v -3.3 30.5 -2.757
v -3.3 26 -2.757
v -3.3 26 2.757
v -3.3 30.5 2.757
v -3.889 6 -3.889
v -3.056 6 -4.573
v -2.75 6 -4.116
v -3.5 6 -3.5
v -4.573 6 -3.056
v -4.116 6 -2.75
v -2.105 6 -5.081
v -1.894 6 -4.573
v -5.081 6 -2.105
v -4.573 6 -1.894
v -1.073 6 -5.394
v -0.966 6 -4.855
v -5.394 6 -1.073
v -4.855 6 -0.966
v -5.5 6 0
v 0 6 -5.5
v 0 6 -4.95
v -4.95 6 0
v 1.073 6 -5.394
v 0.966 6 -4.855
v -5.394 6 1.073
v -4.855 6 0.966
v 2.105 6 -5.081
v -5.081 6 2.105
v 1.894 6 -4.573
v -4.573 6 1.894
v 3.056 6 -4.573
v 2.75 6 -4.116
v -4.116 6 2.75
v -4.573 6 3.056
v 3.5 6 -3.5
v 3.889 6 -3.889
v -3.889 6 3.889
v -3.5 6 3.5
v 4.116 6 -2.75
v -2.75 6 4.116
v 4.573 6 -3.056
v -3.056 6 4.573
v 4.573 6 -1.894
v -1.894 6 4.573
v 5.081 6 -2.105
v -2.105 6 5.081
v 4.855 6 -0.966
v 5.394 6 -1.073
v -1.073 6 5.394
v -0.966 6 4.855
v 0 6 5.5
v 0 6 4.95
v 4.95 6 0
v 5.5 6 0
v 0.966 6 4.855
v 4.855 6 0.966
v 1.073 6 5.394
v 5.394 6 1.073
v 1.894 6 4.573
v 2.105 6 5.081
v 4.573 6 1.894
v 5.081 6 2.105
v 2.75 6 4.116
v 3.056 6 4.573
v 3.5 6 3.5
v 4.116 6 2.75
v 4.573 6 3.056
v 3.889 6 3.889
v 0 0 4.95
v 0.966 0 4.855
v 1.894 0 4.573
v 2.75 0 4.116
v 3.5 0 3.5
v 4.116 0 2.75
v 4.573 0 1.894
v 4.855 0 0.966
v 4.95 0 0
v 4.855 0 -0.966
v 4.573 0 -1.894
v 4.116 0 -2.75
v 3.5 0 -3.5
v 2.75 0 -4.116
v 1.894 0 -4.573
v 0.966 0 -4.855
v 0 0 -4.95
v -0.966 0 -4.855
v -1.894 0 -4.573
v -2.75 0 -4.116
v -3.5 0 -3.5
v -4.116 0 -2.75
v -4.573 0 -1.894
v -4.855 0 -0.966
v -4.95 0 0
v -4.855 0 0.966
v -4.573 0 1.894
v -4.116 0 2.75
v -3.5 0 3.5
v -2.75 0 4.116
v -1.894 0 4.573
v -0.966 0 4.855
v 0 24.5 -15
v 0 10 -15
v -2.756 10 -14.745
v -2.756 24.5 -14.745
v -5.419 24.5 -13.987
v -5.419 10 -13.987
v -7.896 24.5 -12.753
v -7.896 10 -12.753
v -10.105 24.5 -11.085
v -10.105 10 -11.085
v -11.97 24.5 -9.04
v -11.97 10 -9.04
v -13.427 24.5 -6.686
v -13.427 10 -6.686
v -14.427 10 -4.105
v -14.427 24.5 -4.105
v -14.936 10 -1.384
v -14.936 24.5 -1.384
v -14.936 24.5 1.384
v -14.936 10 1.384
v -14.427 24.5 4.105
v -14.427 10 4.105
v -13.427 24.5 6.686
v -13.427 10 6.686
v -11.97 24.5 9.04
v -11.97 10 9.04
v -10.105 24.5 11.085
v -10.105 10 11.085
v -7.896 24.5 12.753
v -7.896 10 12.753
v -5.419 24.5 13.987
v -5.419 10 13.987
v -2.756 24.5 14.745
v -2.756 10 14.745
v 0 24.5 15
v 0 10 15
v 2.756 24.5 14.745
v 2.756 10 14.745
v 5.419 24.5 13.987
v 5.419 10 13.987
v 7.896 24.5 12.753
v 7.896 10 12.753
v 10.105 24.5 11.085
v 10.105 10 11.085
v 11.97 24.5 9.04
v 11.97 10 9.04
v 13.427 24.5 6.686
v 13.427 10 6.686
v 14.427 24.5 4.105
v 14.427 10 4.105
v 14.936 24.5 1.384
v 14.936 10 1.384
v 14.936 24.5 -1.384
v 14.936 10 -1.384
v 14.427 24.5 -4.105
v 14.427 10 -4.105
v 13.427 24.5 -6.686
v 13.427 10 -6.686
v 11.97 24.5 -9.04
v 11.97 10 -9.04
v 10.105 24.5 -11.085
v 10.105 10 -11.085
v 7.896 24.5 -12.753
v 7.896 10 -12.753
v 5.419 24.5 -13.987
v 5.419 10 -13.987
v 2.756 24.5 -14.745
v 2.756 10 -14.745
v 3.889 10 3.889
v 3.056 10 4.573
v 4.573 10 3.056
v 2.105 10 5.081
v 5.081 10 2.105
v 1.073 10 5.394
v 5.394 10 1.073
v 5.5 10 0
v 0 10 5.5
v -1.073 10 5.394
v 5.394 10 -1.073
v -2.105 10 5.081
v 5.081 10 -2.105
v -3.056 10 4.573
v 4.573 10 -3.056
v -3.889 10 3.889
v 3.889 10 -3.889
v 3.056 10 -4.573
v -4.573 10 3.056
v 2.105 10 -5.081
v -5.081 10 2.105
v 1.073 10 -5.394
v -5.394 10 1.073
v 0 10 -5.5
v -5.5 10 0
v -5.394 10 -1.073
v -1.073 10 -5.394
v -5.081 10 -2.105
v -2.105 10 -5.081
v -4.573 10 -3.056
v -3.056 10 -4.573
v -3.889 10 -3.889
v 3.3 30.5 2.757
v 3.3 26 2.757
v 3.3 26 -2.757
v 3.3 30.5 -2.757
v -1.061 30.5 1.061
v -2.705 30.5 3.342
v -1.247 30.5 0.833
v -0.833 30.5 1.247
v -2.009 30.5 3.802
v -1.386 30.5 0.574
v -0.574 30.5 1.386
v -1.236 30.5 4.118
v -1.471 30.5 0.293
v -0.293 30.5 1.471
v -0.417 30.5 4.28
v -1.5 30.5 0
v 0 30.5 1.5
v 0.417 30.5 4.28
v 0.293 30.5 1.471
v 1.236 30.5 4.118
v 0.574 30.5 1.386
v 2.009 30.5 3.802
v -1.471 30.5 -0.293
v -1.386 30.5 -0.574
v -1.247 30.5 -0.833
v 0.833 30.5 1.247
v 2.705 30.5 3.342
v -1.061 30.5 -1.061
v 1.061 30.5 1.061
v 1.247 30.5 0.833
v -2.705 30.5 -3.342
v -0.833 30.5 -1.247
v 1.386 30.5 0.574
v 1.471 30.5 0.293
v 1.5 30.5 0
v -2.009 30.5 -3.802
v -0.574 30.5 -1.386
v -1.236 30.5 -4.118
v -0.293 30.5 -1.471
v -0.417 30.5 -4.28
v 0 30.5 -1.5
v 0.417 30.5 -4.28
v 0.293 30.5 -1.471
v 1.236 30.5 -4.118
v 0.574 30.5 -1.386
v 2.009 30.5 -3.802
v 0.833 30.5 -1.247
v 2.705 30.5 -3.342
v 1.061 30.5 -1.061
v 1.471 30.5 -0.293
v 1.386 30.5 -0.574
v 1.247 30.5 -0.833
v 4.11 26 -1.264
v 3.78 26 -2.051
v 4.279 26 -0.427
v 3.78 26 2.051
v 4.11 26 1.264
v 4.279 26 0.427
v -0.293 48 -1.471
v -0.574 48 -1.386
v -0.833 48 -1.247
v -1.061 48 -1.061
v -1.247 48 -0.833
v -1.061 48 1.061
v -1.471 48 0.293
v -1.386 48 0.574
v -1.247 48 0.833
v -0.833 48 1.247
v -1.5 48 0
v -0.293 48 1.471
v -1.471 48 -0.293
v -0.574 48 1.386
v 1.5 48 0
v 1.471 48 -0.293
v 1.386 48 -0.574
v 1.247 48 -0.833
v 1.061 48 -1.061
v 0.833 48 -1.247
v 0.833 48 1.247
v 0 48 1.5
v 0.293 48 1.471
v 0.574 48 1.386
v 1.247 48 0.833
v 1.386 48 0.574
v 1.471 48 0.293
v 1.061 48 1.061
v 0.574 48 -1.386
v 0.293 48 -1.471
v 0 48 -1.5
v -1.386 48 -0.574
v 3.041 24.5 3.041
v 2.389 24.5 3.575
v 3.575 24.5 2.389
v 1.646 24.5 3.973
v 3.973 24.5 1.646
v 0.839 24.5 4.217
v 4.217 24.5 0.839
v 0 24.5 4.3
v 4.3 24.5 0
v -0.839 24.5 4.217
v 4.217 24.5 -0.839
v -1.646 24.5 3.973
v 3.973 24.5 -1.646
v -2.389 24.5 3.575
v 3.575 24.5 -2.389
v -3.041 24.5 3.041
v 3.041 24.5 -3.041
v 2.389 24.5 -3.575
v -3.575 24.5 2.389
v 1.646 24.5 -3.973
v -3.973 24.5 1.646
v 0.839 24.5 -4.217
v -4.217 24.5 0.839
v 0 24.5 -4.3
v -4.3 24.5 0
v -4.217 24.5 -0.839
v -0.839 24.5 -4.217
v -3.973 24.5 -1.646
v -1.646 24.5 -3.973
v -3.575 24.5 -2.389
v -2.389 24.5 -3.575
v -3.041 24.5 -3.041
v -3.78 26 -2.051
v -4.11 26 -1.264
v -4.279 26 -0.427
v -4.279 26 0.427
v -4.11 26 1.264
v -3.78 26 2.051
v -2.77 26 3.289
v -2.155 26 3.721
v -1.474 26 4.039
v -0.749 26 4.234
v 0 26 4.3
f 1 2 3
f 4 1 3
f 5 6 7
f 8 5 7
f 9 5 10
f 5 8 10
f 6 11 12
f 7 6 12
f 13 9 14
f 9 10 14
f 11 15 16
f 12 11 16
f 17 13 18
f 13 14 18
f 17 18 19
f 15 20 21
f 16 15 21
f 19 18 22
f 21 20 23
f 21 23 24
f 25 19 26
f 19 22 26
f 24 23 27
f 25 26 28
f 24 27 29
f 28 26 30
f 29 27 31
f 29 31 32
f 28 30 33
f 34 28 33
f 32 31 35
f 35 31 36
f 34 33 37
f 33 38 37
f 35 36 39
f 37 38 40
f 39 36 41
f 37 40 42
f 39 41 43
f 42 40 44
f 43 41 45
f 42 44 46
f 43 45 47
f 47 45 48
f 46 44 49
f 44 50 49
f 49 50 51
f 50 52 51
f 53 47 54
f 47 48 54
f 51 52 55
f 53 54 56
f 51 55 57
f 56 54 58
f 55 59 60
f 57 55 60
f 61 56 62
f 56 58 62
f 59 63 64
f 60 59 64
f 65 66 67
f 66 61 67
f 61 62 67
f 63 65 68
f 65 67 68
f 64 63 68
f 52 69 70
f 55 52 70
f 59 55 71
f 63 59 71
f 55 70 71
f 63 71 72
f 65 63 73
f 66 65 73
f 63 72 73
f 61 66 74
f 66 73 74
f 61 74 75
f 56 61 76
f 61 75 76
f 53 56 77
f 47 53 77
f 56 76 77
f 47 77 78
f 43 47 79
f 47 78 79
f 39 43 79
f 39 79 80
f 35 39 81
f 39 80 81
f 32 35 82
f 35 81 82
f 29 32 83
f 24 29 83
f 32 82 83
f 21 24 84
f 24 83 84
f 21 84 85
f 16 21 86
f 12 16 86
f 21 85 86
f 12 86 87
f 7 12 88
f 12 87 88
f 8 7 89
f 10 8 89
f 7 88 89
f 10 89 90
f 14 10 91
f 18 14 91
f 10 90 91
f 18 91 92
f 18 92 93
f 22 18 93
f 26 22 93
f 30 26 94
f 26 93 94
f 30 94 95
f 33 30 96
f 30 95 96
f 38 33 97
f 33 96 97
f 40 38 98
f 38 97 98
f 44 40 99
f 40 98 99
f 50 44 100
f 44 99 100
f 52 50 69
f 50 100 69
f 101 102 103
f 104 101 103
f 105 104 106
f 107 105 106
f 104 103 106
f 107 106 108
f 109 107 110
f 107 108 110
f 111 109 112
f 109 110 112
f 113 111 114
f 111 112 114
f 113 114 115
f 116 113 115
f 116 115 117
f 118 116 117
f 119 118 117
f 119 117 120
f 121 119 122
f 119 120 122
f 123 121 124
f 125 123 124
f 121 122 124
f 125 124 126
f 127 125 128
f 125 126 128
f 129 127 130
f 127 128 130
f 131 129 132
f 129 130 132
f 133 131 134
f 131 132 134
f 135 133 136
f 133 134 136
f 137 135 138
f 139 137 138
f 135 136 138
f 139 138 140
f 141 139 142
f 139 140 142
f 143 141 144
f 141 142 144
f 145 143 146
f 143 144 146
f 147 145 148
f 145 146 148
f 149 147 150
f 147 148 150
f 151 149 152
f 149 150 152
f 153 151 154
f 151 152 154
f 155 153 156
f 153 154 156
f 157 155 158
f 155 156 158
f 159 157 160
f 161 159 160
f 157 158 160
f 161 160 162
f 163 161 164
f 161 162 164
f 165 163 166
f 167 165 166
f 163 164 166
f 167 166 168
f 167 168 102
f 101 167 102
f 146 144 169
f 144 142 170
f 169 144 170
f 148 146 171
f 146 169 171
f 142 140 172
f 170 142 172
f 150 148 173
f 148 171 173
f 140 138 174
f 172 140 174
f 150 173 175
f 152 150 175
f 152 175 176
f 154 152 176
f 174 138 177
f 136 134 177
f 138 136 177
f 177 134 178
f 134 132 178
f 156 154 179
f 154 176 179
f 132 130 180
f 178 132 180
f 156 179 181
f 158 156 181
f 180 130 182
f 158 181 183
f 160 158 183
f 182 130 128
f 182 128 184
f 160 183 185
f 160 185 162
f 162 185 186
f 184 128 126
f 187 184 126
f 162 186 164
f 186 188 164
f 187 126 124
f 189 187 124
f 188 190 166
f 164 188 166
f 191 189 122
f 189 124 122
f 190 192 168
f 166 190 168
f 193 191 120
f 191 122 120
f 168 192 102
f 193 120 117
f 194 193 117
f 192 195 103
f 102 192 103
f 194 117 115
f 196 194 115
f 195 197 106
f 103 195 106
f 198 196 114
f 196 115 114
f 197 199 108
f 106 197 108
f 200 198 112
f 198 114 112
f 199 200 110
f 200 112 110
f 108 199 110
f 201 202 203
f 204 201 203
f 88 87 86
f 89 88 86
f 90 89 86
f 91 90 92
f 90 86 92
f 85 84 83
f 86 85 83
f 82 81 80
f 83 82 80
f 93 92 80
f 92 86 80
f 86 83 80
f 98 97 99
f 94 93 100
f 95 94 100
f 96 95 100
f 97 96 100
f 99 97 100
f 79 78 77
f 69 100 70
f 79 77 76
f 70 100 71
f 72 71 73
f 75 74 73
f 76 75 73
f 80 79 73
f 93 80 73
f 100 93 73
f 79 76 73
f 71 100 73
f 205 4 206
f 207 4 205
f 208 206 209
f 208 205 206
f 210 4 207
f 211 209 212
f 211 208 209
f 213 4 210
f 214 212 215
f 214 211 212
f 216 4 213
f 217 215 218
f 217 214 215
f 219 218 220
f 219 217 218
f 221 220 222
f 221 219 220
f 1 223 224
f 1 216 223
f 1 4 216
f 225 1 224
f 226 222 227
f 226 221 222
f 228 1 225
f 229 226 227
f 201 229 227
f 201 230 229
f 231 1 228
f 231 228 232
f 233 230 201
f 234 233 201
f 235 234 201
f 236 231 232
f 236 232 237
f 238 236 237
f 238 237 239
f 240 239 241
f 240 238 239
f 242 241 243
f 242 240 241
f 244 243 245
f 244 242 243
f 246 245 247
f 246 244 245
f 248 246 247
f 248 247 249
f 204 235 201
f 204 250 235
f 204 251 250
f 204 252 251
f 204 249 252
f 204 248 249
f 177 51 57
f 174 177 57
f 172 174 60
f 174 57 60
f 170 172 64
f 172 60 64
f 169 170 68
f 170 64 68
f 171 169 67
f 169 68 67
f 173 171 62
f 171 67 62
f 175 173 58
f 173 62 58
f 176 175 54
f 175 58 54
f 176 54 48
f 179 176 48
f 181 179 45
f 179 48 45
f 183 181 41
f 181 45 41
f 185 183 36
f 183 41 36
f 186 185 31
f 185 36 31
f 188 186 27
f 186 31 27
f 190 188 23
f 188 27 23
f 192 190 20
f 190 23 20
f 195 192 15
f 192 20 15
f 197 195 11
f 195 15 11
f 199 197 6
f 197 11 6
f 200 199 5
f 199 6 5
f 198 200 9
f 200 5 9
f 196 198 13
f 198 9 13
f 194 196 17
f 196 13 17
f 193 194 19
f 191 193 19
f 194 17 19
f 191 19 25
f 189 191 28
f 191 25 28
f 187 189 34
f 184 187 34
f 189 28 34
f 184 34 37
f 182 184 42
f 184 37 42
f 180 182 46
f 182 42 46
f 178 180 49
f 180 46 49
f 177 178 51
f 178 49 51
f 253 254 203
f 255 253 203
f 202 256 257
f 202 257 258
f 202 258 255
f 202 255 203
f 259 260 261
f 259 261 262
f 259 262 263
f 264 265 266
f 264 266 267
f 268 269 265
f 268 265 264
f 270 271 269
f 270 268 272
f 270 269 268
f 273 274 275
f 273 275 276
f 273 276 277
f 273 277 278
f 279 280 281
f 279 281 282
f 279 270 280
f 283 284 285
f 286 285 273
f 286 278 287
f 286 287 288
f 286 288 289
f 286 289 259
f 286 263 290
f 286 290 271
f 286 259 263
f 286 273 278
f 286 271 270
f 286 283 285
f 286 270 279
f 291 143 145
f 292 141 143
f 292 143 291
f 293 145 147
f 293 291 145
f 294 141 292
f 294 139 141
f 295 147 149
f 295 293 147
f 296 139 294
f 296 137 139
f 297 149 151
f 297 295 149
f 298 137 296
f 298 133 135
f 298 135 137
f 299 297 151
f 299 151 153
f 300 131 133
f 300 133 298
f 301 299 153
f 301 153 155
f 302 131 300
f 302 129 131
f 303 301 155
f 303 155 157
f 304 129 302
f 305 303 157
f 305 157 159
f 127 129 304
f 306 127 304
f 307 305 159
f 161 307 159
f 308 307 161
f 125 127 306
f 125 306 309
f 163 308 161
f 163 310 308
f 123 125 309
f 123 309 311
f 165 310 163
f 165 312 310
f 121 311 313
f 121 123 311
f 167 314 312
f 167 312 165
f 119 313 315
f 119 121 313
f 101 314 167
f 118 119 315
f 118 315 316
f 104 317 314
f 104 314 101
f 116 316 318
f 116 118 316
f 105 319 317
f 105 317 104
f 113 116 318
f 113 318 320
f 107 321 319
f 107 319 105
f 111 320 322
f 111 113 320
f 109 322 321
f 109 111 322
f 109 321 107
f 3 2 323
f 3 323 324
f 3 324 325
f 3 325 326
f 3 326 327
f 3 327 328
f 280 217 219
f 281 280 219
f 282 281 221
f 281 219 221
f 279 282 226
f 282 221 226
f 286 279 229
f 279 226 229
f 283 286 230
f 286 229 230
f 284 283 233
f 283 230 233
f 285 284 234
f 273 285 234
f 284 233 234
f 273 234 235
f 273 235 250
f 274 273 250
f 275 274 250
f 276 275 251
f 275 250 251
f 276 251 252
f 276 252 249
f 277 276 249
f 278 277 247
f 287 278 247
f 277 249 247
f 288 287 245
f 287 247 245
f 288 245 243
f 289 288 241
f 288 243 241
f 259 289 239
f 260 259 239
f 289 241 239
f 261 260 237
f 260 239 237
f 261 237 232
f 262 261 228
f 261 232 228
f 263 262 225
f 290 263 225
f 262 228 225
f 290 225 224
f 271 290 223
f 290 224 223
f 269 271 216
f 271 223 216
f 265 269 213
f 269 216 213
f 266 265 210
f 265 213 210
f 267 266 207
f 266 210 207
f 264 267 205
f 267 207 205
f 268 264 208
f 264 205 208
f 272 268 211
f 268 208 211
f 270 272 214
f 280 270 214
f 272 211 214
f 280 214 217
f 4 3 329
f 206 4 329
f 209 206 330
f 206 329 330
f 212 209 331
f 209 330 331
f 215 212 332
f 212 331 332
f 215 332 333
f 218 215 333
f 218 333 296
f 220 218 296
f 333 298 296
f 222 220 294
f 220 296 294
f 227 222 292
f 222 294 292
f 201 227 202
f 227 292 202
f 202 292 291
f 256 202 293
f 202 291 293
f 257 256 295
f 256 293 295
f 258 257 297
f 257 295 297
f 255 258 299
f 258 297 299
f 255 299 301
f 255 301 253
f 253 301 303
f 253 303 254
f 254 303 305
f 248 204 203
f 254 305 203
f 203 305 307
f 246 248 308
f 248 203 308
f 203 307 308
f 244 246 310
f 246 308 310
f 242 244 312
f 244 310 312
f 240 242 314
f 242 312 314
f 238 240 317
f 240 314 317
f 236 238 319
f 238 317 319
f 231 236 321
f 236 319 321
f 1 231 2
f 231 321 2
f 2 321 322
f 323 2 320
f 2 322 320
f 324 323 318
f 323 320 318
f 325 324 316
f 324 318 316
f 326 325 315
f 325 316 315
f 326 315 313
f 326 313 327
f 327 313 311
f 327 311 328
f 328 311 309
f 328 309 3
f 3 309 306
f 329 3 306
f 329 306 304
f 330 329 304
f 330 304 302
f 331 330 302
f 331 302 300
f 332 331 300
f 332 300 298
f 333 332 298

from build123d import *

# Parameters (mm, degrees)
SKETCH1_R           = 4.95
BOSS_EXTRUDE1_DEPTH = 6
SKETCH2_R           = 5.5
BOSS_EXTRUDE2_DEPTH = 4
SKETCH3_R           = 15
BOSS_EXTRUDE3_DEPTH = 14.5
SKETCH4_R           = 4.3
BOSS_EXTRUDE4_DEPTH = 1.5
BOSS_EXTRUDE5_DEPTH = 4.5
SKETCH6_R           = 1.5
BOSS_EXTRUDE6_DEPTH = 17.5


with BuildPart() as part:
    # Sketch1 → Boss-Extrude1 (new body)
    with BuildSketch(Plane(origin=(0, 0, 0), x_dir=(1, 0, 0), z_dir=(0, 1, 0))):
        with Locations(Location((0, 0, 0), (0, 0, 270))):
            Circle(SKETCH1_R)
    extrude(amount=BOSS_EXTRUDE1_DEPTH)

    # Sketch2 → Boss-Extrude2 (add)
    with BuildSketch(Plane(origin=(0, 6, 0), x_dir=(1, 0, 0), z_dir=(0, 1, 0))):
        with Locations(Location((0, 0, 0), (0, 0, 270))):
            Circle(SKETCH2_R)
    extrude(amount=BOSS_EXTRUDE2_DEPTH)

    # Sketch3 → Boss-Extrude3 (add)
    with BuildSketch(Plane(origin=(0, 10, 0), x_dir=(1, 0, 0), z_dir=(0, 1, 0))):
        with Locations(Location((0, 0, 0), (0, 0, 90))):
            Circle(SKETCH3_R)
    extrude(amount=BOSS_EXTRUDE3_DEPTH)

    # Sketch4 → Boss-Extrude4 (add)
    with BuildSketch(Plane(origin=(0, 24.5, 0), x_dir=(1, 0, 0), z_dir=(0, 1, 0))):
        with Locations(Location((0, 0, 0), (0, 0, 270))):
            Circle(SKETCH4_R)
    extrude(amount=BOSS_EXTRUDE4_DEPTH)

    # Sketch5 → Boss-Extrude5 (add)
    with BuildSketch(Plane(origin=(0, 26, 0), x_dir=(1, 0, 0), z_dir=(0, 1, 0))):
        with BuildLine():
            Line((-3.3, 2.75680975), (-3.3, -2.75680975))
            ThreePointArc((-3.3, -2.75680975), (0, -4.3), (3.3, -2.75680975))
            Line((3.3, -2.75680975), (3.3, 2.75680975))
            ThreePointArc((3.3, 2.75680975), (0, 4.3), (-3.3, 2.75680975))
        make_face()
    extrude(amount=BOSS_EXTRUDE5_DEPTH)

    # Sketch6 → Boss-Extrude6 (add)
    with BuildSketch(Plane(origin=(0, 30.5, 0), x_dir=(1, 0, 0), z_dir=(0, 1, 0))):
        with Locations(Location((0, 0, 0), (0, 0, 270))):
            Circle(SKETCH6_R)
    extrude(amount=BOSS_EXTRUDE6_DEPTH)


solid = part.part
